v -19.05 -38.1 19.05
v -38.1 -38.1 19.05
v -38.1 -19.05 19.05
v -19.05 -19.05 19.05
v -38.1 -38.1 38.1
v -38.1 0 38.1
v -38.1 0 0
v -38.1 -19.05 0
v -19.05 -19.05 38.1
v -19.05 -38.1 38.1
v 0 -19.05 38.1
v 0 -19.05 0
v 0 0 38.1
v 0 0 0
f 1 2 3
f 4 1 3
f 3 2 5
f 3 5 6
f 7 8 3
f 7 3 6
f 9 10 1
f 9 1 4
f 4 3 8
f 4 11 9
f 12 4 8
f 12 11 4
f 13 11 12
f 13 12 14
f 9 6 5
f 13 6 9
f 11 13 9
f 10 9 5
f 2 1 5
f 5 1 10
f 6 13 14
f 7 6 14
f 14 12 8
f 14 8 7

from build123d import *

# Parameters (mm, degrees)
F0_W      = 19.05
F0_H      = 19.05
F1_DEPTH  = 19.05
F2_W      = 38.1
F2_H      = 19.05
F3_DEPTH  = 38.1
F1_FACE_W = 19.05
F1_FACE_H = 19.05
F4_DEPTH  = 19.05
F5_W      = 19.05
F5_H      = 19.05
F6_DEPTH  = 25.4


with BuildPart() as f1:
    # F0 (on Right) → F1 (new body)
    with BuildSketch(Plane.YZ):
        Polygon((-19.05, 0), (0, 0), (0, 38.1), (-19.05, 38.1), (-19.05, 19.05), align=None)
        with Locations((-28.575, 28.575)):
            Rectangle(F0_W, F0_H)
    extrude(amount=-F1_DEPTH)

    # F2 (on Right) → F3 (join)
    with BuildSketch(Plane.YZ):
        with Locations((-19.05, 28.575)):
            Rectangle(F2_W, F2_H)
    extrude(amount=-F3_DEPTH)

    # F1_face (on face) → F4 (join)
    with BuildSketch(Plane(origin=(-19.05, -9.525, 9.525), x_dir=(0, 1, 0), z_dir=(-1, 0, 0))):
        Rectangle(F1_FACE_W, F1_FACE_H)
    extrude(amount=F4_DEPTH)

    # F5 (on face) → F6 (cut)
    with BuildSketch(Plane.XY.offset(38.1)):
        with Locations((-9.525, -28.575)):
            Rectangle(F5_W, F5_H)
    extrude(amount=-F6_DEPTH, mode=Mode.SUBTRACT)


solid = f1.part
